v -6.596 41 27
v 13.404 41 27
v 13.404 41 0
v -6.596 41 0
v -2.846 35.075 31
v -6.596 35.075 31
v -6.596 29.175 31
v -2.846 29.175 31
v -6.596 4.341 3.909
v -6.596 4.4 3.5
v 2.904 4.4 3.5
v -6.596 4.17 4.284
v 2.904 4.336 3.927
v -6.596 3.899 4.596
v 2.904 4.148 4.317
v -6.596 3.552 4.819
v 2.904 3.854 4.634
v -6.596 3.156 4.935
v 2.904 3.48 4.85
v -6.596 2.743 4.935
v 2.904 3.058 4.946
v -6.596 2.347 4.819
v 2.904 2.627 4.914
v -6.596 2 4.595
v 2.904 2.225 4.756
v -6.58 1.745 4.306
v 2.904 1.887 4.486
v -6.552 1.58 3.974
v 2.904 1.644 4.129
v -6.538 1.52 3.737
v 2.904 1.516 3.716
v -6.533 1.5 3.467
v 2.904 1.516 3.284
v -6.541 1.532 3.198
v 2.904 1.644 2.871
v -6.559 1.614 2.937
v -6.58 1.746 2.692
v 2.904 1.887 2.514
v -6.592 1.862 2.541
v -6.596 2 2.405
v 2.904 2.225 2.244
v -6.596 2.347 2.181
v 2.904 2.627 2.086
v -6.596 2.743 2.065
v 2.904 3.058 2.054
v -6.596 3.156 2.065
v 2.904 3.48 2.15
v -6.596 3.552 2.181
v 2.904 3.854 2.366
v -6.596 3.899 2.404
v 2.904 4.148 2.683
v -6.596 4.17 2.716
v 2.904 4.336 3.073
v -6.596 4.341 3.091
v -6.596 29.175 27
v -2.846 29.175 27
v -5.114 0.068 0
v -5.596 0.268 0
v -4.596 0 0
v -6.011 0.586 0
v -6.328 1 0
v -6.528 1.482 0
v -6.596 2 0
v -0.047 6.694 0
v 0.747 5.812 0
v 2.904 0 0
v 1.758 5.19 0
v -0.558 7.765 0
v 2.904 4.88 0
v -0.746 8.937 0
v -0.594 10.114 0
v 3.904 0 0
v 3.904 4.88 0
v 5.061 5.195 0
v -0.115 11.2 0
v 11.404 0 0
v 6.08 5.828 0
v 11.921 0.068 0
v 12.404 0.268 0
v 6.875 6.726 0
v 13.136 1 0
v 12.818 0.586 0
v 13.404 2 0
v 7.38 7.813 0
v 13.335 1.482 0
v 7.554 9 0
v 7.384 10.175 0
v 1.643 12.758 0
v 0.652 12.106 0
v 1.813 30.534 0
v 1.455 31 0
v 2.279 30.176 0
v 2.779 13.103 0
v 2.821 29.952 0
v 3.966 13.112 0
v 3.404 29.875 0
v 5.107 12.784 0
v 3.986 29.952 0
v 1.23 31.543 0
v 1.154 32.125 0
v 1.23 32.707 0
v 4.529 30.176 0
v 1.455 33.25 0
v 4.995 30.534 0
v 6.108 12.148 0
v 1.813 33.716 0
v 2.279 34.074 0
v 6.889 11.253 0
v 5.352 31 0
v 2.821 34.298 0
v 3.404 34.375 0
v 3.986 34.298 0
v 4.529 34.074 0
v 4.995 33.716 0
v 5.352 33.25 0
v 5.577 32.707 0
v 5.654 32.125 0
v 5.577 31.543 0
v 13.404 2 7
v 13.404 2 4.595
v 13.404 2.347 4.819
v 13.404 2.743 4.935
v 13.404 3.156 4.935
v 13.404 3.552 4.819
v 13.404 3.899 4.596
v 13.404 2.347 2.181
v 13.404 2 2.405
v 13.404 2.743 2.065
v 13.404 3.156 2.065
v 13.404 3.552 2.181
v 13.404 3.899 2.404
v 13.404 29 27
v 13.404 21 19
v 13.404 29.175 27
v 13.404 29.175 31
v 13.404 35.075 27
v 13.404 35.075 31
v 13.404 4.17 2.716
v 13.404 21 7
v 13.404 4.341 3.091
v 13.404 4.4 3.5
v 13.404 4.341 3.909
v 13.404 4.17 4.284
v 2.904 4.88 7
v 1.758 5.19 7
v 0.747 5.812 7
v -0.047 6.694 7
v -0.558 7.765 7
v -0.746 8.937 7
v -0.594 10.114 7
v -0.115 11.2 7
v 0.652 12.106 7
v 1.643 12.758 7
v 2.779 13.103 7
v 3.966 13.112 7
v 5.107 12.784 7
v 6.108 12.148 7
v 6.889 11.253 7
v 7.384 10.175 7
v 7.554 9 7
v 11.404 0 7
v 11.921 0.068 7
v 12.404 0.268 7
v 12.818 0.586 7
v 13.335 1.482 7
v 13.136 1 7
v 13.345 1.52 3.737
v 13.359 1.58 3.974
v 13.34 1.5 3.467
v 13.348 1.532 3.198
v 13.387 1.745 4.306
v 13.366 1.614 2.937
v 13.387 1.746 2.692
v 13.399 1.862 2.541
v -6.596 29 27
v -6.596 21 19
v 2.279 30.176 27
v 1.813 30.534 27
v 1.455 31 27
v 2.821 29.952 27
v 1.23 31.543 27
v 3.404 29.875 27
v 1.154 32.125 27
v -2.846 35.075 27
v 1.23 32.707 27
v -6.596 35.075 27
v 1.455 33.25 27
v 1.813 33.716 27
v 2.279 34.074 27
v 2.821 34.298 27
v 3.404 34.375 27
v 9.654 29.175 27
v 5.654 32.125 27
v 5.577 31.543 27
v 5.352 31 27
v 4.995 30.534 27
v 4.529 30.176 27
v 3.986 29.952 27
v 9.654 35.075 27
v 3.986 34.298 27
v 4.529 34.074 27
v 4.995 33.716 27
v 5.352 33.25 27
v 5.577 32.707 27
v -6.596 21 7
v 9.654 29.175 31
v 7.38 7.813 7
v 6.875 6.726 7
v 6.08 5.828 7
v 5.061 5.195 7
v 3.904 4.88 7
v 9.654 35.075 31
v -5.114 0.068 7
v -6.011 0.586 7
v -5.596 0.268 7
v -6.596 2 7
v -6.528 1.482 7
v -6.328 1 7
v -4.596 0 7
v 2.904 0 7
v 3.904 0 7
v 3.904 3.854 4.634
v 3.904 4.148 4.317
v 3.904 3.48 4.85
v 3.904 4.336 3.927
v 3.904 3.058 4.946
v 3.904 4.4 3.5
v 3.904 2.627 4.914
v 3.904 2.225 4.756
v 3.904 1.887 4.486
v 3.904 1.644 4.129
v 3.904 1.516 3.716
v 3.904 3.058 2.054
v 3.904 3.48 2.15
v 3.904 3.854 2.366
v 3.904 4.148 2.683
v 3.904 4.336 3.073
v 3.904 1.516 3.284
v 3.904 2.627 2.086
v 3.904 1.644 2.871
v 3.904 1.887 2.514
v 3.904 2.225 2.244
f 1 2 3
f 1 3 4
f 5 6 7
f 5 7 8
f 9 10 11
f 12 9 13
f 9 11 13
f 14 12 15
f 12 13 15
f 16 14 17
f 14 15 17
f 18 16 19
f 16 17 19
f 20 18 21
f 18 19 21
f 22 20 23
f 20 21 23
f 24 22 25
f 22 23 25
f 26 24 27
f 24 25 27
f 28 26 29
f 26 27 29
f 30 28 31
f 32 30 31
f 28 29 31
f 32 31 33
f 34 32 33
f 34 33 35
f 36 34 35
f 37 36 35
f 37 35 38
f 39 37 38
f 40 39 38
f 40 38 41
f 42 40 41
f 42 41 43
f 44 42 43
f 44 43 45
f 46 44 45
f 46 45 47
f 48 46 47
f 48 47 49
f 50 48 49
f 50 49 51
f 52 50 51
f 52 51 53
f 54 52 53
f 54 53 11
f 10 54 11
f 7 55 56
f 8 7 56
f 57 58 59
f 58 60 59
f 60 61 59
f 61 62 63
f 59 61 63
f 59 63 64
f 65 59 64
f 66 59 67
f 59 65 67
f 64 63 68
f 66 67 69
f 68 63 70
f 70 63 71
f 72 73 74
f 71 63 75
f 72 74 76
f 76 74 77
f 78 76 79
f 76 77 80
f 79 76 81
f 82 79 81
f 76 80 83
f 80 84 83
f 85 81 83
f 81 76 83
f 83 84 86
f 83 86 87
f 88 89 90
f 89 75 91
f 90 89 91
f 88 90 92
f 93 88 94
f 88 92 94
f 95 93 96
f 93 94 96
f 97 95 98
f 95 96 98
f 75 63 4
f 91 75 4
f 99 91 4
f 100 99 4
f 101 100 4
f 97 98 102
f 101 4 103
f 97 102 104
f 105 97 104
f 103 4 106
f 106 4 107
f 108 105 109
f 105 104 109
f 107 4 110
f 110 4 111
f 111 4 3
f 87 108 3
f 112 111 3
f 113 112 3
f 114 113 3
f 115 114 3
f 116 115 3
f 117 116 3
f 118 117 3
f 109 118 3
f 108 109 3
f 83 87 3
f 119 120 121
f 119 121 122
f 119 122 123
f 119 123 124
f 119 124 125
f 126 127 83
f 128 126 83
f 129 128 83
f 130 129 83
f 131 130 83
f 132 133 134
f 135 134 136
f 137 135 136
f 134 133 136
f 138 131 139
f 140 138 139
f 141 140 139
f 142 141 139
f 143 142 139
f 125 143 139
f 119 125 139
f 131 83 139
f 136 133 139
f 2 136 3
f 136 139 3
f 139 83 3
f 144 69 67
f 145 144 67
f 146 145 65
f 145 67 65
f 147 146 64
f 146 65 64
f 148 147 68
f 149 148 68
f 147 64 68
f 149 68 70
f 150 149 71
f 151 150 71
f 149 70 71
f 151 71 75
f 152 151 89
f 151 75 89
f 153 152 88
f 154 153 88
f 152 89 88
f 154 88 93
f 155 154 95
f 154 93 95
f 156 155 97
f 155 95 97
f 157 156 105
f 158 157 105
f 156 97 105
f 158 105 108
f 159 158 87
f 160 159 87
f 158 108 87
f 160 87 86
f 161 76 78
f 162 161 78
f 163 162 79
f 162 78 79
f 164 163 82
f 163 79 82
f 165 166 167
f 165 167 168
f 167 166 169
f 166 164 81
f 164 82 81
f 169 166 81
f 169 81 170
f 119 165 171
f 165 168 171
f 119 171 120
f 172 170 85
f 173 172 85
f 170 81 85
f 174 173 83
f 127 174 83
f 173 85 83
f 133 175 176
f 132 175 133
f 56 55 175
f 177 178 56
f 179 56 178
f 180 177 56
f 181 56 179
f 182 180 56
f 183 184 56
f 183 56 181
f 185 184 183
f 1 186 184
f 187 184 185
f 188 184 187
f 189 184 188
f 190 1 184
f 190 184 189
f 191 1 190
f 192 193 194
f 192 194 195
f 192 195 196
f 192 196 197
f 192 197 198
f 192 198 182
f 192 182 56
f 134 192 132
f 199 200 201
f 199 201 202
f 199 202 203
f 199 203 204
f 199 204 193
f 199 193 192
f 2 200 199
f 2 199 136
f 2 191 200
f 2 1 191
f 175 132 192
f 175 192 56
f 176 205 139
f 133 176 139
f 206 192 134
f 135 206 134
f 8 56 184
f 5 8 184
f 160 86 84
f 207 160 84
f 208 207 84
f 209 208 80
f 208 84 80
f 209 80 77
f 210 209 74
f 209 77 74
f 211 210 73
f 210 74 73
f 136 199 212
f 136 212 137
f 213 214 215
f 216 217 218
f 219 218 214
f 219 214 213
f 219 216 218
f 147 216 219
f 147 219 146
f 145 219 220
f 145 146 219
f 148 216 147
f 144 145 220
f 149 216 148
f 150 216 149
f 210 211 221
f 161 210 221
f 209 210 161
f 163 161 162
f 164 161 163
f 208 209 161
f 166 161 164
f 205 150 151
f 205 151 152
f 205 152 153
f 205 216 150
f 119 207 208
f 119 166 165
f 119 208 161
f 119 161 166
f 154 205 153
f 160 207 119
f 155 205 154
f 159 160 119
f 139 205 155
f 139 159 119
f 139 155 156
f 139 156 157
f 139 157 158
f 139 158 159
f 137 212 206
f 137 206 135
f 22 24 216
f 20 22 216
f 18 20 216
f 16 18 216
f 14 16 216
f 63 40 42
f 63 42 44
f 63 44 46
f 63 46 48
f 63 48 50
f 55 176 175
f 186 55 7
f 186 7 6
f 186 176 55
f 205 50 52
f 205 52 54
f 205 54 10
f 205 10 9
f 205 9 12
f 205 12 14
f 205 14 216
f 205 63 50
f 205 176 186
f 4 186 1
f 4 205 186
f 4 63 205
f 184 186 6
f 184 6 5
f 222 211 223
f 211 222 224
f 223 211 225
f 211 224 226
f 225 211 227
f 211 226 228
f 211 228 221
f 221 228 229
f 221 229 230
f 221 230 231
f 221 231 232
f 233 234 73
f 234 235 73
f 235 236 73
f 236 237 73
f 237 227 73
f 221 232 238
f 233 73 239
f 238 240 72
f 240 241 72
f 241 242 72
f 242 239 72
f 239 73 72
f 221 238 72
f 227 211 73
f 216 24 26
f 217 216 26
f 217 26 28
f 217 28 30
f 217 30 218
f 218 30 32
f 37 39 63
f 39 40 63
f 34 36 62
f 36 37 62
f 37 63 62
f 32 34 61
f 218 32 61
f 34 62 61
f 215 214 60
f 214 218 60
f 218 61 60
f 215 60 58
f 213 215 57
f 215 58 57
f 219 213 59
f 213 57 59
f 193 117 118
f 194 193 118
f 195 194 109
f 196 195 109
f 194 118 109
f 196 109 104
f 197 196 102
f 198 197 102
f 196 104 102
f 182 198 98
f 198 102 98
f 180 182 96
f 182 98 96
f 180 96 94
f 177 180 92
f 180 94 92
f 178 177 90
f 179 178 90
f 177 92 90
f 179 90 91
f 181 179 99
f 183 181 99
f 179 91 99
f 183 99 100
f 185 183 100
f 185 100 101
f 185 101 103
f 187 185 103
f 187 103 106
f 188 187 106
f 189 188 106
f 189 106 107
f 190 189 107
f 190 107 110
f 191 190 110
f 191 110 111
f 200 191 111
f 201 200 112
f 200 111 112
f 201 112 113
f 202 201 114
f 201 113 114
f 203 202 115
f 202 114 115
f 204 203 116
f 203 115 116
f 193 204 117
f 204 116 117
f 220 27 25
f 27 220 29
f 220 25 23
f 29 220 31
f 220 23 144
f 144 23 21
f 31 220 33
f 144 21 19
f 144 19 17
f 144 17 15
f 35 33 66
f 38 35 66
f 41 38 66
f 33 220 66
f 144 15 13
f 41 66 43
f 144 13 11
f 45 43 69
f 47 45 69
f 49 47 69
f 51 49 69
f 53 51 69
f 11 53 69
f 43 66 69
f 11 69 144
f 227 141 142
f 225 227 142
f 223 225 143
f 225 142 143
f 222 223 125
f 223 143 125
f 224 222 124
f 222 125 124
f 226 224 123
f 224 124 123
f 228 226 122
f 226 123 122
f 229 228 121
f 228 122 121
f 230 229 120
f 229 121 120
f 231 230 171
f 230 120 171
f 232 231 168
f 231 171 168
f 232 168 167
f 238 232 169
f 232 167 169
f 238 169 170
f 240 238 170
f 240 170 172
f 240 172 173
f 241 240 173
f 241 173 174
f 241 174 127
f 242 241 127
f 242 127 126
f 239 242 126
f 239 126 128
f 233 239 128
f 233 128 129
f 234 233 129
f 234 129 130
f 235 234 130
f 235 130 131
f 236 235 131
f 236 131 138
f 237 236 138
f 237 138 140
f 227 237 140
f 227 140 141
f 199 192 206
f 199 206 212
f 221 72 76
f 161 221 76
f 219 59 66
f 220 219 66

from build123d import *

# Parameters (mm, degrees)
F1_DEPTH    = 7
F2_R        = 1.45
F3_DEPTH    = 25
F4_T1_DEPTH = 17
F5_DEPTH    = 27
F0_W        = 3.75
F0_H        = 5.9
F6_DEPTH    = 31
F7_SIZE     = 8


# Not quite as in the source:
# - a fillet or chamfer that OpenCascade refuses, or shapes differently, is made with other operations: its cross-section is extruded or revolved along the edge and cut away or added


with BuildPart() as f1:
    # F0 (on Top) → F1 (new body)
    with BuildSketch(Plane.XY):
        with BuildLine():
            Line((-6.5963959517, 29.175), (-6.5963959517, 21))
            Line((-6.5963959517, 21), (3.4036040483, 21))
            Line((3.4036040483, 21), (3.4036040483, 29.875))
            ThreePointArc((3.4036040483, 29.875), (1.8126137907, 30.5340097423), (1.1536040483, 32.125))
            ThreePointArc((1.1536040483, 32.125), (1.8126137907, 33.7159902577), (3.4036040483, 34.375))
            Line((3.4036040483, 34.375), (3.4036040483, 41))
            Line((3.4036040483, 41), (-6.5963959517, 41))
            Line((-6.5963959517, 41), (-6.5963959517, 35.075))
            Line((-6.5963959517, 35.075), (-2.8463959517, 35.075))
            Line((-2.8463959517, 35.075), (-2.8463959517, 29.175))
            Line((-2.8463959517, 29.175), (-6.5963959517, 29.175))
        make_face()
        with BuildLine():
            Line((3.4036040483, 29.875), (3.4036040483, 21))
            Line((3.4036040483, 21), (13.4036040483, 21))
            Line((13.4036040483, 21), (13.4036040483, 29.175))
            Line((13.4036040483, 29.175), (9.6536040483, 29.175))
            Line((9.6536040483, 29.175), (9.6536040483, 35.075))
            Line((9.6536040483, 35.075), (13.4036040483, 35.075))
            Line((13.4036040483, 35.075), (13.4036040483, 41))
            Line((13.4036040483, 41), (3.4036040483, 41))
            Line((3.4036040483, 41), (3.4036040483, 34.375))
            ThreePointArc((3.4036040483, 34.375), (4.994594306, 33.7159902577), (5.6536040483, 32.125))
            ThreePointArc((5.6536040483, 32.125), (4.994594306, 30.5340097423), (3.4036040483, 29.875))
        make_face()
        with BuildLine():
            Line((-6.5963959517, 21), (-6.5963959517, 0))
            Line((-6.5963959517, 0), (2.9036040483, 0))
            Line((2.9036040483, 0), (2.9036040483, 1.2661458509))
            ThreePointArc((2.9036040483, 1.2661458509), (-1.8967497135, 14.6540914389), (11.1536040483, 9))
            ThreePointArc((11.1536040483, 9), (9.0576954873, 3.6996462382), (3.9036040483, 1.2661458509))
            Line((3.9036040483, 1.2661458509), (3.9036040483, 0))
            Line((3.9036040483, 0), (13.4036040483, 0))
            Line((13.4036040483, 0), (13.4036040483, 21))
            Line((13.4036040483, 21), (3.4036040483, 21))
            Line((3.4036040483, 21), (-6.5963959517, 21))
        make_face()
        with BuildLine():
            ThreePointArc((11.1536040483, 9), (-1.8967497135, 14.6540914389), (2.9036040483, 1.2661458509))
            Line((2.9036040483, 1.2661458509), (2.9036040483, 4.880230589))
            ThreePointArc((2.9036040483, 4.880230589), (0.6515593539, 12.1062437123), (7.5536040483, 9))
            ThreePointArc((7.5536040483, 9), (6.5098477606, 6.2479553056), (3.9036040483, 4.880230589))
            Line((3.9036040483, 4.880230589), (3.9036040483, 1.2661458509))
            ThreePointArc((3.9036040483, 1.2661458509), (9.0576954873, 3.6996462382), (11.1536040483, 9))
        make_face()
    extrude(amount=F1_DEPTH)

    # F2 (on face) → F3 (cut)
    with BuildSketch(Plane.YZ.offset(13.4036040483)):
        with Locations((2.95, 3.5)):
            Circle(F2_R)
    extrude(amount=-F3_DEPTH, mode=Mode.SUBTRACT)

    # F4: fillet of radius 2 on 2 edges, made by hand

    # F4_s2 → F4_t1 (cut)
    with BuildSketch(Plane.XY.offset(-5)):
        with BuildLine():
            ThreePointArc((11.4036040483, 0), (12.8178176107, 0.5857864376), (13.4036040483, 2))
            Line((13.4036040483, 2), (13.4036040483, 0))
            Line((13.4036040483, 0), (11.4036040483, 0))
        make_face()
        with BuildLine():
            ThreePointArc((-6.5963959517, 2), (-6.010609514, 0.5857864376), (-4.5963959517, 0))
            Line((-4.5963959517, 0), (-6.5963959517, 0))
            Line((-6.5963959517, 0), (-6.5963959517, 2))
        make_face()
    extrude(amount=F4_T1_DEPTH, mode=Mode.SUBTRACT)

    # F0 (on Top) → F5 (join)
    with BuildSketch(Plane.XY):
        with BuildLine():
            Line((3.4036040483, 29.875), (3.4036040483, 21))
            Line((3.4036040483, 21), (13.4036040483, 21))
            Line((13.4036040483, 21), (13.4036040483, 29.175))
            Line((13.4036040483, 29.175), (9.6536040483, 29.175))
            Line((9.6536040483, 29.175), (9.6536040483, 35.075))
            Line((9.6536040483, 35.075), (13.4036040483, 35.075))
            Line((13.4036040483, 35.075), (13.4036040483, 41))
            Line((13.4036040483, 41), (3.4036040483, 41))
            Line((3.4036040483, 41), (3.4036040483, 34.375))
            ThreePointArc((3.4036040483, 34.375), (4.994594306, 33.7159902577), (5.6536040483, 32.125))
            ThreePointArc((5.6536040483, 32.125), (4.994594306, 30.5340097423), (3.4036040483, 29.875))
        make_face()
        with BuildLine():
            Line((-6.5963959517, 29.175), (-6.5963959517, 21))
            Line((-6.5963959517, 21), (3.4036040483, 21))
            Line((3.4036040483, 21), (3.4036040483, 29.875))
            ThreePointArc((3.4036040483, 29.875), (1.8126137907, 30.5340097423), (1.1536040483, 32.125))
            ThreePointArc((1.1536040483, 32.125), (1.8126137907, 33.7159902577), (3.4036040483, 34.375))
            Line((3.4036040483, 34.375), (3.4036040483, 41))
            Line((3.4036040483, 41), (-6.5963959517, 41))
            Line((-6.5963959517, 41), (-6.5963959517, 35.075))
            Line((-6.5963959517, 35.075), (-2.8463959517, 35.075))
            Line((-2.8463959517, 35.075), (-2.8463959517, 29.175))
            Line((-2.8463959517, 29.175), (-6.5963959517, 29.175))
        make_face()
    extrude(amount=F5_DEPTH)

    # F0 (on Top) → F6 (join)
    with BuildSketch(Plane.XY):
        with Locations((-4.7213959517, 32.125)):
            Rectangle(F0_W, F0_H)
        with Locations((11.5286040483, 32.125)):
            Rectangle(F0_W, F0_H)
    extrude(amount=F6_DEPTH)

    # F7
    f7_edges = [f1.edges().sort_by_distance(p)[0] for p in [
        (3.403604, 21, 27),
    ]]
    chamfer(f7_edges, length=F7_SIZE)


solid = f1.part
